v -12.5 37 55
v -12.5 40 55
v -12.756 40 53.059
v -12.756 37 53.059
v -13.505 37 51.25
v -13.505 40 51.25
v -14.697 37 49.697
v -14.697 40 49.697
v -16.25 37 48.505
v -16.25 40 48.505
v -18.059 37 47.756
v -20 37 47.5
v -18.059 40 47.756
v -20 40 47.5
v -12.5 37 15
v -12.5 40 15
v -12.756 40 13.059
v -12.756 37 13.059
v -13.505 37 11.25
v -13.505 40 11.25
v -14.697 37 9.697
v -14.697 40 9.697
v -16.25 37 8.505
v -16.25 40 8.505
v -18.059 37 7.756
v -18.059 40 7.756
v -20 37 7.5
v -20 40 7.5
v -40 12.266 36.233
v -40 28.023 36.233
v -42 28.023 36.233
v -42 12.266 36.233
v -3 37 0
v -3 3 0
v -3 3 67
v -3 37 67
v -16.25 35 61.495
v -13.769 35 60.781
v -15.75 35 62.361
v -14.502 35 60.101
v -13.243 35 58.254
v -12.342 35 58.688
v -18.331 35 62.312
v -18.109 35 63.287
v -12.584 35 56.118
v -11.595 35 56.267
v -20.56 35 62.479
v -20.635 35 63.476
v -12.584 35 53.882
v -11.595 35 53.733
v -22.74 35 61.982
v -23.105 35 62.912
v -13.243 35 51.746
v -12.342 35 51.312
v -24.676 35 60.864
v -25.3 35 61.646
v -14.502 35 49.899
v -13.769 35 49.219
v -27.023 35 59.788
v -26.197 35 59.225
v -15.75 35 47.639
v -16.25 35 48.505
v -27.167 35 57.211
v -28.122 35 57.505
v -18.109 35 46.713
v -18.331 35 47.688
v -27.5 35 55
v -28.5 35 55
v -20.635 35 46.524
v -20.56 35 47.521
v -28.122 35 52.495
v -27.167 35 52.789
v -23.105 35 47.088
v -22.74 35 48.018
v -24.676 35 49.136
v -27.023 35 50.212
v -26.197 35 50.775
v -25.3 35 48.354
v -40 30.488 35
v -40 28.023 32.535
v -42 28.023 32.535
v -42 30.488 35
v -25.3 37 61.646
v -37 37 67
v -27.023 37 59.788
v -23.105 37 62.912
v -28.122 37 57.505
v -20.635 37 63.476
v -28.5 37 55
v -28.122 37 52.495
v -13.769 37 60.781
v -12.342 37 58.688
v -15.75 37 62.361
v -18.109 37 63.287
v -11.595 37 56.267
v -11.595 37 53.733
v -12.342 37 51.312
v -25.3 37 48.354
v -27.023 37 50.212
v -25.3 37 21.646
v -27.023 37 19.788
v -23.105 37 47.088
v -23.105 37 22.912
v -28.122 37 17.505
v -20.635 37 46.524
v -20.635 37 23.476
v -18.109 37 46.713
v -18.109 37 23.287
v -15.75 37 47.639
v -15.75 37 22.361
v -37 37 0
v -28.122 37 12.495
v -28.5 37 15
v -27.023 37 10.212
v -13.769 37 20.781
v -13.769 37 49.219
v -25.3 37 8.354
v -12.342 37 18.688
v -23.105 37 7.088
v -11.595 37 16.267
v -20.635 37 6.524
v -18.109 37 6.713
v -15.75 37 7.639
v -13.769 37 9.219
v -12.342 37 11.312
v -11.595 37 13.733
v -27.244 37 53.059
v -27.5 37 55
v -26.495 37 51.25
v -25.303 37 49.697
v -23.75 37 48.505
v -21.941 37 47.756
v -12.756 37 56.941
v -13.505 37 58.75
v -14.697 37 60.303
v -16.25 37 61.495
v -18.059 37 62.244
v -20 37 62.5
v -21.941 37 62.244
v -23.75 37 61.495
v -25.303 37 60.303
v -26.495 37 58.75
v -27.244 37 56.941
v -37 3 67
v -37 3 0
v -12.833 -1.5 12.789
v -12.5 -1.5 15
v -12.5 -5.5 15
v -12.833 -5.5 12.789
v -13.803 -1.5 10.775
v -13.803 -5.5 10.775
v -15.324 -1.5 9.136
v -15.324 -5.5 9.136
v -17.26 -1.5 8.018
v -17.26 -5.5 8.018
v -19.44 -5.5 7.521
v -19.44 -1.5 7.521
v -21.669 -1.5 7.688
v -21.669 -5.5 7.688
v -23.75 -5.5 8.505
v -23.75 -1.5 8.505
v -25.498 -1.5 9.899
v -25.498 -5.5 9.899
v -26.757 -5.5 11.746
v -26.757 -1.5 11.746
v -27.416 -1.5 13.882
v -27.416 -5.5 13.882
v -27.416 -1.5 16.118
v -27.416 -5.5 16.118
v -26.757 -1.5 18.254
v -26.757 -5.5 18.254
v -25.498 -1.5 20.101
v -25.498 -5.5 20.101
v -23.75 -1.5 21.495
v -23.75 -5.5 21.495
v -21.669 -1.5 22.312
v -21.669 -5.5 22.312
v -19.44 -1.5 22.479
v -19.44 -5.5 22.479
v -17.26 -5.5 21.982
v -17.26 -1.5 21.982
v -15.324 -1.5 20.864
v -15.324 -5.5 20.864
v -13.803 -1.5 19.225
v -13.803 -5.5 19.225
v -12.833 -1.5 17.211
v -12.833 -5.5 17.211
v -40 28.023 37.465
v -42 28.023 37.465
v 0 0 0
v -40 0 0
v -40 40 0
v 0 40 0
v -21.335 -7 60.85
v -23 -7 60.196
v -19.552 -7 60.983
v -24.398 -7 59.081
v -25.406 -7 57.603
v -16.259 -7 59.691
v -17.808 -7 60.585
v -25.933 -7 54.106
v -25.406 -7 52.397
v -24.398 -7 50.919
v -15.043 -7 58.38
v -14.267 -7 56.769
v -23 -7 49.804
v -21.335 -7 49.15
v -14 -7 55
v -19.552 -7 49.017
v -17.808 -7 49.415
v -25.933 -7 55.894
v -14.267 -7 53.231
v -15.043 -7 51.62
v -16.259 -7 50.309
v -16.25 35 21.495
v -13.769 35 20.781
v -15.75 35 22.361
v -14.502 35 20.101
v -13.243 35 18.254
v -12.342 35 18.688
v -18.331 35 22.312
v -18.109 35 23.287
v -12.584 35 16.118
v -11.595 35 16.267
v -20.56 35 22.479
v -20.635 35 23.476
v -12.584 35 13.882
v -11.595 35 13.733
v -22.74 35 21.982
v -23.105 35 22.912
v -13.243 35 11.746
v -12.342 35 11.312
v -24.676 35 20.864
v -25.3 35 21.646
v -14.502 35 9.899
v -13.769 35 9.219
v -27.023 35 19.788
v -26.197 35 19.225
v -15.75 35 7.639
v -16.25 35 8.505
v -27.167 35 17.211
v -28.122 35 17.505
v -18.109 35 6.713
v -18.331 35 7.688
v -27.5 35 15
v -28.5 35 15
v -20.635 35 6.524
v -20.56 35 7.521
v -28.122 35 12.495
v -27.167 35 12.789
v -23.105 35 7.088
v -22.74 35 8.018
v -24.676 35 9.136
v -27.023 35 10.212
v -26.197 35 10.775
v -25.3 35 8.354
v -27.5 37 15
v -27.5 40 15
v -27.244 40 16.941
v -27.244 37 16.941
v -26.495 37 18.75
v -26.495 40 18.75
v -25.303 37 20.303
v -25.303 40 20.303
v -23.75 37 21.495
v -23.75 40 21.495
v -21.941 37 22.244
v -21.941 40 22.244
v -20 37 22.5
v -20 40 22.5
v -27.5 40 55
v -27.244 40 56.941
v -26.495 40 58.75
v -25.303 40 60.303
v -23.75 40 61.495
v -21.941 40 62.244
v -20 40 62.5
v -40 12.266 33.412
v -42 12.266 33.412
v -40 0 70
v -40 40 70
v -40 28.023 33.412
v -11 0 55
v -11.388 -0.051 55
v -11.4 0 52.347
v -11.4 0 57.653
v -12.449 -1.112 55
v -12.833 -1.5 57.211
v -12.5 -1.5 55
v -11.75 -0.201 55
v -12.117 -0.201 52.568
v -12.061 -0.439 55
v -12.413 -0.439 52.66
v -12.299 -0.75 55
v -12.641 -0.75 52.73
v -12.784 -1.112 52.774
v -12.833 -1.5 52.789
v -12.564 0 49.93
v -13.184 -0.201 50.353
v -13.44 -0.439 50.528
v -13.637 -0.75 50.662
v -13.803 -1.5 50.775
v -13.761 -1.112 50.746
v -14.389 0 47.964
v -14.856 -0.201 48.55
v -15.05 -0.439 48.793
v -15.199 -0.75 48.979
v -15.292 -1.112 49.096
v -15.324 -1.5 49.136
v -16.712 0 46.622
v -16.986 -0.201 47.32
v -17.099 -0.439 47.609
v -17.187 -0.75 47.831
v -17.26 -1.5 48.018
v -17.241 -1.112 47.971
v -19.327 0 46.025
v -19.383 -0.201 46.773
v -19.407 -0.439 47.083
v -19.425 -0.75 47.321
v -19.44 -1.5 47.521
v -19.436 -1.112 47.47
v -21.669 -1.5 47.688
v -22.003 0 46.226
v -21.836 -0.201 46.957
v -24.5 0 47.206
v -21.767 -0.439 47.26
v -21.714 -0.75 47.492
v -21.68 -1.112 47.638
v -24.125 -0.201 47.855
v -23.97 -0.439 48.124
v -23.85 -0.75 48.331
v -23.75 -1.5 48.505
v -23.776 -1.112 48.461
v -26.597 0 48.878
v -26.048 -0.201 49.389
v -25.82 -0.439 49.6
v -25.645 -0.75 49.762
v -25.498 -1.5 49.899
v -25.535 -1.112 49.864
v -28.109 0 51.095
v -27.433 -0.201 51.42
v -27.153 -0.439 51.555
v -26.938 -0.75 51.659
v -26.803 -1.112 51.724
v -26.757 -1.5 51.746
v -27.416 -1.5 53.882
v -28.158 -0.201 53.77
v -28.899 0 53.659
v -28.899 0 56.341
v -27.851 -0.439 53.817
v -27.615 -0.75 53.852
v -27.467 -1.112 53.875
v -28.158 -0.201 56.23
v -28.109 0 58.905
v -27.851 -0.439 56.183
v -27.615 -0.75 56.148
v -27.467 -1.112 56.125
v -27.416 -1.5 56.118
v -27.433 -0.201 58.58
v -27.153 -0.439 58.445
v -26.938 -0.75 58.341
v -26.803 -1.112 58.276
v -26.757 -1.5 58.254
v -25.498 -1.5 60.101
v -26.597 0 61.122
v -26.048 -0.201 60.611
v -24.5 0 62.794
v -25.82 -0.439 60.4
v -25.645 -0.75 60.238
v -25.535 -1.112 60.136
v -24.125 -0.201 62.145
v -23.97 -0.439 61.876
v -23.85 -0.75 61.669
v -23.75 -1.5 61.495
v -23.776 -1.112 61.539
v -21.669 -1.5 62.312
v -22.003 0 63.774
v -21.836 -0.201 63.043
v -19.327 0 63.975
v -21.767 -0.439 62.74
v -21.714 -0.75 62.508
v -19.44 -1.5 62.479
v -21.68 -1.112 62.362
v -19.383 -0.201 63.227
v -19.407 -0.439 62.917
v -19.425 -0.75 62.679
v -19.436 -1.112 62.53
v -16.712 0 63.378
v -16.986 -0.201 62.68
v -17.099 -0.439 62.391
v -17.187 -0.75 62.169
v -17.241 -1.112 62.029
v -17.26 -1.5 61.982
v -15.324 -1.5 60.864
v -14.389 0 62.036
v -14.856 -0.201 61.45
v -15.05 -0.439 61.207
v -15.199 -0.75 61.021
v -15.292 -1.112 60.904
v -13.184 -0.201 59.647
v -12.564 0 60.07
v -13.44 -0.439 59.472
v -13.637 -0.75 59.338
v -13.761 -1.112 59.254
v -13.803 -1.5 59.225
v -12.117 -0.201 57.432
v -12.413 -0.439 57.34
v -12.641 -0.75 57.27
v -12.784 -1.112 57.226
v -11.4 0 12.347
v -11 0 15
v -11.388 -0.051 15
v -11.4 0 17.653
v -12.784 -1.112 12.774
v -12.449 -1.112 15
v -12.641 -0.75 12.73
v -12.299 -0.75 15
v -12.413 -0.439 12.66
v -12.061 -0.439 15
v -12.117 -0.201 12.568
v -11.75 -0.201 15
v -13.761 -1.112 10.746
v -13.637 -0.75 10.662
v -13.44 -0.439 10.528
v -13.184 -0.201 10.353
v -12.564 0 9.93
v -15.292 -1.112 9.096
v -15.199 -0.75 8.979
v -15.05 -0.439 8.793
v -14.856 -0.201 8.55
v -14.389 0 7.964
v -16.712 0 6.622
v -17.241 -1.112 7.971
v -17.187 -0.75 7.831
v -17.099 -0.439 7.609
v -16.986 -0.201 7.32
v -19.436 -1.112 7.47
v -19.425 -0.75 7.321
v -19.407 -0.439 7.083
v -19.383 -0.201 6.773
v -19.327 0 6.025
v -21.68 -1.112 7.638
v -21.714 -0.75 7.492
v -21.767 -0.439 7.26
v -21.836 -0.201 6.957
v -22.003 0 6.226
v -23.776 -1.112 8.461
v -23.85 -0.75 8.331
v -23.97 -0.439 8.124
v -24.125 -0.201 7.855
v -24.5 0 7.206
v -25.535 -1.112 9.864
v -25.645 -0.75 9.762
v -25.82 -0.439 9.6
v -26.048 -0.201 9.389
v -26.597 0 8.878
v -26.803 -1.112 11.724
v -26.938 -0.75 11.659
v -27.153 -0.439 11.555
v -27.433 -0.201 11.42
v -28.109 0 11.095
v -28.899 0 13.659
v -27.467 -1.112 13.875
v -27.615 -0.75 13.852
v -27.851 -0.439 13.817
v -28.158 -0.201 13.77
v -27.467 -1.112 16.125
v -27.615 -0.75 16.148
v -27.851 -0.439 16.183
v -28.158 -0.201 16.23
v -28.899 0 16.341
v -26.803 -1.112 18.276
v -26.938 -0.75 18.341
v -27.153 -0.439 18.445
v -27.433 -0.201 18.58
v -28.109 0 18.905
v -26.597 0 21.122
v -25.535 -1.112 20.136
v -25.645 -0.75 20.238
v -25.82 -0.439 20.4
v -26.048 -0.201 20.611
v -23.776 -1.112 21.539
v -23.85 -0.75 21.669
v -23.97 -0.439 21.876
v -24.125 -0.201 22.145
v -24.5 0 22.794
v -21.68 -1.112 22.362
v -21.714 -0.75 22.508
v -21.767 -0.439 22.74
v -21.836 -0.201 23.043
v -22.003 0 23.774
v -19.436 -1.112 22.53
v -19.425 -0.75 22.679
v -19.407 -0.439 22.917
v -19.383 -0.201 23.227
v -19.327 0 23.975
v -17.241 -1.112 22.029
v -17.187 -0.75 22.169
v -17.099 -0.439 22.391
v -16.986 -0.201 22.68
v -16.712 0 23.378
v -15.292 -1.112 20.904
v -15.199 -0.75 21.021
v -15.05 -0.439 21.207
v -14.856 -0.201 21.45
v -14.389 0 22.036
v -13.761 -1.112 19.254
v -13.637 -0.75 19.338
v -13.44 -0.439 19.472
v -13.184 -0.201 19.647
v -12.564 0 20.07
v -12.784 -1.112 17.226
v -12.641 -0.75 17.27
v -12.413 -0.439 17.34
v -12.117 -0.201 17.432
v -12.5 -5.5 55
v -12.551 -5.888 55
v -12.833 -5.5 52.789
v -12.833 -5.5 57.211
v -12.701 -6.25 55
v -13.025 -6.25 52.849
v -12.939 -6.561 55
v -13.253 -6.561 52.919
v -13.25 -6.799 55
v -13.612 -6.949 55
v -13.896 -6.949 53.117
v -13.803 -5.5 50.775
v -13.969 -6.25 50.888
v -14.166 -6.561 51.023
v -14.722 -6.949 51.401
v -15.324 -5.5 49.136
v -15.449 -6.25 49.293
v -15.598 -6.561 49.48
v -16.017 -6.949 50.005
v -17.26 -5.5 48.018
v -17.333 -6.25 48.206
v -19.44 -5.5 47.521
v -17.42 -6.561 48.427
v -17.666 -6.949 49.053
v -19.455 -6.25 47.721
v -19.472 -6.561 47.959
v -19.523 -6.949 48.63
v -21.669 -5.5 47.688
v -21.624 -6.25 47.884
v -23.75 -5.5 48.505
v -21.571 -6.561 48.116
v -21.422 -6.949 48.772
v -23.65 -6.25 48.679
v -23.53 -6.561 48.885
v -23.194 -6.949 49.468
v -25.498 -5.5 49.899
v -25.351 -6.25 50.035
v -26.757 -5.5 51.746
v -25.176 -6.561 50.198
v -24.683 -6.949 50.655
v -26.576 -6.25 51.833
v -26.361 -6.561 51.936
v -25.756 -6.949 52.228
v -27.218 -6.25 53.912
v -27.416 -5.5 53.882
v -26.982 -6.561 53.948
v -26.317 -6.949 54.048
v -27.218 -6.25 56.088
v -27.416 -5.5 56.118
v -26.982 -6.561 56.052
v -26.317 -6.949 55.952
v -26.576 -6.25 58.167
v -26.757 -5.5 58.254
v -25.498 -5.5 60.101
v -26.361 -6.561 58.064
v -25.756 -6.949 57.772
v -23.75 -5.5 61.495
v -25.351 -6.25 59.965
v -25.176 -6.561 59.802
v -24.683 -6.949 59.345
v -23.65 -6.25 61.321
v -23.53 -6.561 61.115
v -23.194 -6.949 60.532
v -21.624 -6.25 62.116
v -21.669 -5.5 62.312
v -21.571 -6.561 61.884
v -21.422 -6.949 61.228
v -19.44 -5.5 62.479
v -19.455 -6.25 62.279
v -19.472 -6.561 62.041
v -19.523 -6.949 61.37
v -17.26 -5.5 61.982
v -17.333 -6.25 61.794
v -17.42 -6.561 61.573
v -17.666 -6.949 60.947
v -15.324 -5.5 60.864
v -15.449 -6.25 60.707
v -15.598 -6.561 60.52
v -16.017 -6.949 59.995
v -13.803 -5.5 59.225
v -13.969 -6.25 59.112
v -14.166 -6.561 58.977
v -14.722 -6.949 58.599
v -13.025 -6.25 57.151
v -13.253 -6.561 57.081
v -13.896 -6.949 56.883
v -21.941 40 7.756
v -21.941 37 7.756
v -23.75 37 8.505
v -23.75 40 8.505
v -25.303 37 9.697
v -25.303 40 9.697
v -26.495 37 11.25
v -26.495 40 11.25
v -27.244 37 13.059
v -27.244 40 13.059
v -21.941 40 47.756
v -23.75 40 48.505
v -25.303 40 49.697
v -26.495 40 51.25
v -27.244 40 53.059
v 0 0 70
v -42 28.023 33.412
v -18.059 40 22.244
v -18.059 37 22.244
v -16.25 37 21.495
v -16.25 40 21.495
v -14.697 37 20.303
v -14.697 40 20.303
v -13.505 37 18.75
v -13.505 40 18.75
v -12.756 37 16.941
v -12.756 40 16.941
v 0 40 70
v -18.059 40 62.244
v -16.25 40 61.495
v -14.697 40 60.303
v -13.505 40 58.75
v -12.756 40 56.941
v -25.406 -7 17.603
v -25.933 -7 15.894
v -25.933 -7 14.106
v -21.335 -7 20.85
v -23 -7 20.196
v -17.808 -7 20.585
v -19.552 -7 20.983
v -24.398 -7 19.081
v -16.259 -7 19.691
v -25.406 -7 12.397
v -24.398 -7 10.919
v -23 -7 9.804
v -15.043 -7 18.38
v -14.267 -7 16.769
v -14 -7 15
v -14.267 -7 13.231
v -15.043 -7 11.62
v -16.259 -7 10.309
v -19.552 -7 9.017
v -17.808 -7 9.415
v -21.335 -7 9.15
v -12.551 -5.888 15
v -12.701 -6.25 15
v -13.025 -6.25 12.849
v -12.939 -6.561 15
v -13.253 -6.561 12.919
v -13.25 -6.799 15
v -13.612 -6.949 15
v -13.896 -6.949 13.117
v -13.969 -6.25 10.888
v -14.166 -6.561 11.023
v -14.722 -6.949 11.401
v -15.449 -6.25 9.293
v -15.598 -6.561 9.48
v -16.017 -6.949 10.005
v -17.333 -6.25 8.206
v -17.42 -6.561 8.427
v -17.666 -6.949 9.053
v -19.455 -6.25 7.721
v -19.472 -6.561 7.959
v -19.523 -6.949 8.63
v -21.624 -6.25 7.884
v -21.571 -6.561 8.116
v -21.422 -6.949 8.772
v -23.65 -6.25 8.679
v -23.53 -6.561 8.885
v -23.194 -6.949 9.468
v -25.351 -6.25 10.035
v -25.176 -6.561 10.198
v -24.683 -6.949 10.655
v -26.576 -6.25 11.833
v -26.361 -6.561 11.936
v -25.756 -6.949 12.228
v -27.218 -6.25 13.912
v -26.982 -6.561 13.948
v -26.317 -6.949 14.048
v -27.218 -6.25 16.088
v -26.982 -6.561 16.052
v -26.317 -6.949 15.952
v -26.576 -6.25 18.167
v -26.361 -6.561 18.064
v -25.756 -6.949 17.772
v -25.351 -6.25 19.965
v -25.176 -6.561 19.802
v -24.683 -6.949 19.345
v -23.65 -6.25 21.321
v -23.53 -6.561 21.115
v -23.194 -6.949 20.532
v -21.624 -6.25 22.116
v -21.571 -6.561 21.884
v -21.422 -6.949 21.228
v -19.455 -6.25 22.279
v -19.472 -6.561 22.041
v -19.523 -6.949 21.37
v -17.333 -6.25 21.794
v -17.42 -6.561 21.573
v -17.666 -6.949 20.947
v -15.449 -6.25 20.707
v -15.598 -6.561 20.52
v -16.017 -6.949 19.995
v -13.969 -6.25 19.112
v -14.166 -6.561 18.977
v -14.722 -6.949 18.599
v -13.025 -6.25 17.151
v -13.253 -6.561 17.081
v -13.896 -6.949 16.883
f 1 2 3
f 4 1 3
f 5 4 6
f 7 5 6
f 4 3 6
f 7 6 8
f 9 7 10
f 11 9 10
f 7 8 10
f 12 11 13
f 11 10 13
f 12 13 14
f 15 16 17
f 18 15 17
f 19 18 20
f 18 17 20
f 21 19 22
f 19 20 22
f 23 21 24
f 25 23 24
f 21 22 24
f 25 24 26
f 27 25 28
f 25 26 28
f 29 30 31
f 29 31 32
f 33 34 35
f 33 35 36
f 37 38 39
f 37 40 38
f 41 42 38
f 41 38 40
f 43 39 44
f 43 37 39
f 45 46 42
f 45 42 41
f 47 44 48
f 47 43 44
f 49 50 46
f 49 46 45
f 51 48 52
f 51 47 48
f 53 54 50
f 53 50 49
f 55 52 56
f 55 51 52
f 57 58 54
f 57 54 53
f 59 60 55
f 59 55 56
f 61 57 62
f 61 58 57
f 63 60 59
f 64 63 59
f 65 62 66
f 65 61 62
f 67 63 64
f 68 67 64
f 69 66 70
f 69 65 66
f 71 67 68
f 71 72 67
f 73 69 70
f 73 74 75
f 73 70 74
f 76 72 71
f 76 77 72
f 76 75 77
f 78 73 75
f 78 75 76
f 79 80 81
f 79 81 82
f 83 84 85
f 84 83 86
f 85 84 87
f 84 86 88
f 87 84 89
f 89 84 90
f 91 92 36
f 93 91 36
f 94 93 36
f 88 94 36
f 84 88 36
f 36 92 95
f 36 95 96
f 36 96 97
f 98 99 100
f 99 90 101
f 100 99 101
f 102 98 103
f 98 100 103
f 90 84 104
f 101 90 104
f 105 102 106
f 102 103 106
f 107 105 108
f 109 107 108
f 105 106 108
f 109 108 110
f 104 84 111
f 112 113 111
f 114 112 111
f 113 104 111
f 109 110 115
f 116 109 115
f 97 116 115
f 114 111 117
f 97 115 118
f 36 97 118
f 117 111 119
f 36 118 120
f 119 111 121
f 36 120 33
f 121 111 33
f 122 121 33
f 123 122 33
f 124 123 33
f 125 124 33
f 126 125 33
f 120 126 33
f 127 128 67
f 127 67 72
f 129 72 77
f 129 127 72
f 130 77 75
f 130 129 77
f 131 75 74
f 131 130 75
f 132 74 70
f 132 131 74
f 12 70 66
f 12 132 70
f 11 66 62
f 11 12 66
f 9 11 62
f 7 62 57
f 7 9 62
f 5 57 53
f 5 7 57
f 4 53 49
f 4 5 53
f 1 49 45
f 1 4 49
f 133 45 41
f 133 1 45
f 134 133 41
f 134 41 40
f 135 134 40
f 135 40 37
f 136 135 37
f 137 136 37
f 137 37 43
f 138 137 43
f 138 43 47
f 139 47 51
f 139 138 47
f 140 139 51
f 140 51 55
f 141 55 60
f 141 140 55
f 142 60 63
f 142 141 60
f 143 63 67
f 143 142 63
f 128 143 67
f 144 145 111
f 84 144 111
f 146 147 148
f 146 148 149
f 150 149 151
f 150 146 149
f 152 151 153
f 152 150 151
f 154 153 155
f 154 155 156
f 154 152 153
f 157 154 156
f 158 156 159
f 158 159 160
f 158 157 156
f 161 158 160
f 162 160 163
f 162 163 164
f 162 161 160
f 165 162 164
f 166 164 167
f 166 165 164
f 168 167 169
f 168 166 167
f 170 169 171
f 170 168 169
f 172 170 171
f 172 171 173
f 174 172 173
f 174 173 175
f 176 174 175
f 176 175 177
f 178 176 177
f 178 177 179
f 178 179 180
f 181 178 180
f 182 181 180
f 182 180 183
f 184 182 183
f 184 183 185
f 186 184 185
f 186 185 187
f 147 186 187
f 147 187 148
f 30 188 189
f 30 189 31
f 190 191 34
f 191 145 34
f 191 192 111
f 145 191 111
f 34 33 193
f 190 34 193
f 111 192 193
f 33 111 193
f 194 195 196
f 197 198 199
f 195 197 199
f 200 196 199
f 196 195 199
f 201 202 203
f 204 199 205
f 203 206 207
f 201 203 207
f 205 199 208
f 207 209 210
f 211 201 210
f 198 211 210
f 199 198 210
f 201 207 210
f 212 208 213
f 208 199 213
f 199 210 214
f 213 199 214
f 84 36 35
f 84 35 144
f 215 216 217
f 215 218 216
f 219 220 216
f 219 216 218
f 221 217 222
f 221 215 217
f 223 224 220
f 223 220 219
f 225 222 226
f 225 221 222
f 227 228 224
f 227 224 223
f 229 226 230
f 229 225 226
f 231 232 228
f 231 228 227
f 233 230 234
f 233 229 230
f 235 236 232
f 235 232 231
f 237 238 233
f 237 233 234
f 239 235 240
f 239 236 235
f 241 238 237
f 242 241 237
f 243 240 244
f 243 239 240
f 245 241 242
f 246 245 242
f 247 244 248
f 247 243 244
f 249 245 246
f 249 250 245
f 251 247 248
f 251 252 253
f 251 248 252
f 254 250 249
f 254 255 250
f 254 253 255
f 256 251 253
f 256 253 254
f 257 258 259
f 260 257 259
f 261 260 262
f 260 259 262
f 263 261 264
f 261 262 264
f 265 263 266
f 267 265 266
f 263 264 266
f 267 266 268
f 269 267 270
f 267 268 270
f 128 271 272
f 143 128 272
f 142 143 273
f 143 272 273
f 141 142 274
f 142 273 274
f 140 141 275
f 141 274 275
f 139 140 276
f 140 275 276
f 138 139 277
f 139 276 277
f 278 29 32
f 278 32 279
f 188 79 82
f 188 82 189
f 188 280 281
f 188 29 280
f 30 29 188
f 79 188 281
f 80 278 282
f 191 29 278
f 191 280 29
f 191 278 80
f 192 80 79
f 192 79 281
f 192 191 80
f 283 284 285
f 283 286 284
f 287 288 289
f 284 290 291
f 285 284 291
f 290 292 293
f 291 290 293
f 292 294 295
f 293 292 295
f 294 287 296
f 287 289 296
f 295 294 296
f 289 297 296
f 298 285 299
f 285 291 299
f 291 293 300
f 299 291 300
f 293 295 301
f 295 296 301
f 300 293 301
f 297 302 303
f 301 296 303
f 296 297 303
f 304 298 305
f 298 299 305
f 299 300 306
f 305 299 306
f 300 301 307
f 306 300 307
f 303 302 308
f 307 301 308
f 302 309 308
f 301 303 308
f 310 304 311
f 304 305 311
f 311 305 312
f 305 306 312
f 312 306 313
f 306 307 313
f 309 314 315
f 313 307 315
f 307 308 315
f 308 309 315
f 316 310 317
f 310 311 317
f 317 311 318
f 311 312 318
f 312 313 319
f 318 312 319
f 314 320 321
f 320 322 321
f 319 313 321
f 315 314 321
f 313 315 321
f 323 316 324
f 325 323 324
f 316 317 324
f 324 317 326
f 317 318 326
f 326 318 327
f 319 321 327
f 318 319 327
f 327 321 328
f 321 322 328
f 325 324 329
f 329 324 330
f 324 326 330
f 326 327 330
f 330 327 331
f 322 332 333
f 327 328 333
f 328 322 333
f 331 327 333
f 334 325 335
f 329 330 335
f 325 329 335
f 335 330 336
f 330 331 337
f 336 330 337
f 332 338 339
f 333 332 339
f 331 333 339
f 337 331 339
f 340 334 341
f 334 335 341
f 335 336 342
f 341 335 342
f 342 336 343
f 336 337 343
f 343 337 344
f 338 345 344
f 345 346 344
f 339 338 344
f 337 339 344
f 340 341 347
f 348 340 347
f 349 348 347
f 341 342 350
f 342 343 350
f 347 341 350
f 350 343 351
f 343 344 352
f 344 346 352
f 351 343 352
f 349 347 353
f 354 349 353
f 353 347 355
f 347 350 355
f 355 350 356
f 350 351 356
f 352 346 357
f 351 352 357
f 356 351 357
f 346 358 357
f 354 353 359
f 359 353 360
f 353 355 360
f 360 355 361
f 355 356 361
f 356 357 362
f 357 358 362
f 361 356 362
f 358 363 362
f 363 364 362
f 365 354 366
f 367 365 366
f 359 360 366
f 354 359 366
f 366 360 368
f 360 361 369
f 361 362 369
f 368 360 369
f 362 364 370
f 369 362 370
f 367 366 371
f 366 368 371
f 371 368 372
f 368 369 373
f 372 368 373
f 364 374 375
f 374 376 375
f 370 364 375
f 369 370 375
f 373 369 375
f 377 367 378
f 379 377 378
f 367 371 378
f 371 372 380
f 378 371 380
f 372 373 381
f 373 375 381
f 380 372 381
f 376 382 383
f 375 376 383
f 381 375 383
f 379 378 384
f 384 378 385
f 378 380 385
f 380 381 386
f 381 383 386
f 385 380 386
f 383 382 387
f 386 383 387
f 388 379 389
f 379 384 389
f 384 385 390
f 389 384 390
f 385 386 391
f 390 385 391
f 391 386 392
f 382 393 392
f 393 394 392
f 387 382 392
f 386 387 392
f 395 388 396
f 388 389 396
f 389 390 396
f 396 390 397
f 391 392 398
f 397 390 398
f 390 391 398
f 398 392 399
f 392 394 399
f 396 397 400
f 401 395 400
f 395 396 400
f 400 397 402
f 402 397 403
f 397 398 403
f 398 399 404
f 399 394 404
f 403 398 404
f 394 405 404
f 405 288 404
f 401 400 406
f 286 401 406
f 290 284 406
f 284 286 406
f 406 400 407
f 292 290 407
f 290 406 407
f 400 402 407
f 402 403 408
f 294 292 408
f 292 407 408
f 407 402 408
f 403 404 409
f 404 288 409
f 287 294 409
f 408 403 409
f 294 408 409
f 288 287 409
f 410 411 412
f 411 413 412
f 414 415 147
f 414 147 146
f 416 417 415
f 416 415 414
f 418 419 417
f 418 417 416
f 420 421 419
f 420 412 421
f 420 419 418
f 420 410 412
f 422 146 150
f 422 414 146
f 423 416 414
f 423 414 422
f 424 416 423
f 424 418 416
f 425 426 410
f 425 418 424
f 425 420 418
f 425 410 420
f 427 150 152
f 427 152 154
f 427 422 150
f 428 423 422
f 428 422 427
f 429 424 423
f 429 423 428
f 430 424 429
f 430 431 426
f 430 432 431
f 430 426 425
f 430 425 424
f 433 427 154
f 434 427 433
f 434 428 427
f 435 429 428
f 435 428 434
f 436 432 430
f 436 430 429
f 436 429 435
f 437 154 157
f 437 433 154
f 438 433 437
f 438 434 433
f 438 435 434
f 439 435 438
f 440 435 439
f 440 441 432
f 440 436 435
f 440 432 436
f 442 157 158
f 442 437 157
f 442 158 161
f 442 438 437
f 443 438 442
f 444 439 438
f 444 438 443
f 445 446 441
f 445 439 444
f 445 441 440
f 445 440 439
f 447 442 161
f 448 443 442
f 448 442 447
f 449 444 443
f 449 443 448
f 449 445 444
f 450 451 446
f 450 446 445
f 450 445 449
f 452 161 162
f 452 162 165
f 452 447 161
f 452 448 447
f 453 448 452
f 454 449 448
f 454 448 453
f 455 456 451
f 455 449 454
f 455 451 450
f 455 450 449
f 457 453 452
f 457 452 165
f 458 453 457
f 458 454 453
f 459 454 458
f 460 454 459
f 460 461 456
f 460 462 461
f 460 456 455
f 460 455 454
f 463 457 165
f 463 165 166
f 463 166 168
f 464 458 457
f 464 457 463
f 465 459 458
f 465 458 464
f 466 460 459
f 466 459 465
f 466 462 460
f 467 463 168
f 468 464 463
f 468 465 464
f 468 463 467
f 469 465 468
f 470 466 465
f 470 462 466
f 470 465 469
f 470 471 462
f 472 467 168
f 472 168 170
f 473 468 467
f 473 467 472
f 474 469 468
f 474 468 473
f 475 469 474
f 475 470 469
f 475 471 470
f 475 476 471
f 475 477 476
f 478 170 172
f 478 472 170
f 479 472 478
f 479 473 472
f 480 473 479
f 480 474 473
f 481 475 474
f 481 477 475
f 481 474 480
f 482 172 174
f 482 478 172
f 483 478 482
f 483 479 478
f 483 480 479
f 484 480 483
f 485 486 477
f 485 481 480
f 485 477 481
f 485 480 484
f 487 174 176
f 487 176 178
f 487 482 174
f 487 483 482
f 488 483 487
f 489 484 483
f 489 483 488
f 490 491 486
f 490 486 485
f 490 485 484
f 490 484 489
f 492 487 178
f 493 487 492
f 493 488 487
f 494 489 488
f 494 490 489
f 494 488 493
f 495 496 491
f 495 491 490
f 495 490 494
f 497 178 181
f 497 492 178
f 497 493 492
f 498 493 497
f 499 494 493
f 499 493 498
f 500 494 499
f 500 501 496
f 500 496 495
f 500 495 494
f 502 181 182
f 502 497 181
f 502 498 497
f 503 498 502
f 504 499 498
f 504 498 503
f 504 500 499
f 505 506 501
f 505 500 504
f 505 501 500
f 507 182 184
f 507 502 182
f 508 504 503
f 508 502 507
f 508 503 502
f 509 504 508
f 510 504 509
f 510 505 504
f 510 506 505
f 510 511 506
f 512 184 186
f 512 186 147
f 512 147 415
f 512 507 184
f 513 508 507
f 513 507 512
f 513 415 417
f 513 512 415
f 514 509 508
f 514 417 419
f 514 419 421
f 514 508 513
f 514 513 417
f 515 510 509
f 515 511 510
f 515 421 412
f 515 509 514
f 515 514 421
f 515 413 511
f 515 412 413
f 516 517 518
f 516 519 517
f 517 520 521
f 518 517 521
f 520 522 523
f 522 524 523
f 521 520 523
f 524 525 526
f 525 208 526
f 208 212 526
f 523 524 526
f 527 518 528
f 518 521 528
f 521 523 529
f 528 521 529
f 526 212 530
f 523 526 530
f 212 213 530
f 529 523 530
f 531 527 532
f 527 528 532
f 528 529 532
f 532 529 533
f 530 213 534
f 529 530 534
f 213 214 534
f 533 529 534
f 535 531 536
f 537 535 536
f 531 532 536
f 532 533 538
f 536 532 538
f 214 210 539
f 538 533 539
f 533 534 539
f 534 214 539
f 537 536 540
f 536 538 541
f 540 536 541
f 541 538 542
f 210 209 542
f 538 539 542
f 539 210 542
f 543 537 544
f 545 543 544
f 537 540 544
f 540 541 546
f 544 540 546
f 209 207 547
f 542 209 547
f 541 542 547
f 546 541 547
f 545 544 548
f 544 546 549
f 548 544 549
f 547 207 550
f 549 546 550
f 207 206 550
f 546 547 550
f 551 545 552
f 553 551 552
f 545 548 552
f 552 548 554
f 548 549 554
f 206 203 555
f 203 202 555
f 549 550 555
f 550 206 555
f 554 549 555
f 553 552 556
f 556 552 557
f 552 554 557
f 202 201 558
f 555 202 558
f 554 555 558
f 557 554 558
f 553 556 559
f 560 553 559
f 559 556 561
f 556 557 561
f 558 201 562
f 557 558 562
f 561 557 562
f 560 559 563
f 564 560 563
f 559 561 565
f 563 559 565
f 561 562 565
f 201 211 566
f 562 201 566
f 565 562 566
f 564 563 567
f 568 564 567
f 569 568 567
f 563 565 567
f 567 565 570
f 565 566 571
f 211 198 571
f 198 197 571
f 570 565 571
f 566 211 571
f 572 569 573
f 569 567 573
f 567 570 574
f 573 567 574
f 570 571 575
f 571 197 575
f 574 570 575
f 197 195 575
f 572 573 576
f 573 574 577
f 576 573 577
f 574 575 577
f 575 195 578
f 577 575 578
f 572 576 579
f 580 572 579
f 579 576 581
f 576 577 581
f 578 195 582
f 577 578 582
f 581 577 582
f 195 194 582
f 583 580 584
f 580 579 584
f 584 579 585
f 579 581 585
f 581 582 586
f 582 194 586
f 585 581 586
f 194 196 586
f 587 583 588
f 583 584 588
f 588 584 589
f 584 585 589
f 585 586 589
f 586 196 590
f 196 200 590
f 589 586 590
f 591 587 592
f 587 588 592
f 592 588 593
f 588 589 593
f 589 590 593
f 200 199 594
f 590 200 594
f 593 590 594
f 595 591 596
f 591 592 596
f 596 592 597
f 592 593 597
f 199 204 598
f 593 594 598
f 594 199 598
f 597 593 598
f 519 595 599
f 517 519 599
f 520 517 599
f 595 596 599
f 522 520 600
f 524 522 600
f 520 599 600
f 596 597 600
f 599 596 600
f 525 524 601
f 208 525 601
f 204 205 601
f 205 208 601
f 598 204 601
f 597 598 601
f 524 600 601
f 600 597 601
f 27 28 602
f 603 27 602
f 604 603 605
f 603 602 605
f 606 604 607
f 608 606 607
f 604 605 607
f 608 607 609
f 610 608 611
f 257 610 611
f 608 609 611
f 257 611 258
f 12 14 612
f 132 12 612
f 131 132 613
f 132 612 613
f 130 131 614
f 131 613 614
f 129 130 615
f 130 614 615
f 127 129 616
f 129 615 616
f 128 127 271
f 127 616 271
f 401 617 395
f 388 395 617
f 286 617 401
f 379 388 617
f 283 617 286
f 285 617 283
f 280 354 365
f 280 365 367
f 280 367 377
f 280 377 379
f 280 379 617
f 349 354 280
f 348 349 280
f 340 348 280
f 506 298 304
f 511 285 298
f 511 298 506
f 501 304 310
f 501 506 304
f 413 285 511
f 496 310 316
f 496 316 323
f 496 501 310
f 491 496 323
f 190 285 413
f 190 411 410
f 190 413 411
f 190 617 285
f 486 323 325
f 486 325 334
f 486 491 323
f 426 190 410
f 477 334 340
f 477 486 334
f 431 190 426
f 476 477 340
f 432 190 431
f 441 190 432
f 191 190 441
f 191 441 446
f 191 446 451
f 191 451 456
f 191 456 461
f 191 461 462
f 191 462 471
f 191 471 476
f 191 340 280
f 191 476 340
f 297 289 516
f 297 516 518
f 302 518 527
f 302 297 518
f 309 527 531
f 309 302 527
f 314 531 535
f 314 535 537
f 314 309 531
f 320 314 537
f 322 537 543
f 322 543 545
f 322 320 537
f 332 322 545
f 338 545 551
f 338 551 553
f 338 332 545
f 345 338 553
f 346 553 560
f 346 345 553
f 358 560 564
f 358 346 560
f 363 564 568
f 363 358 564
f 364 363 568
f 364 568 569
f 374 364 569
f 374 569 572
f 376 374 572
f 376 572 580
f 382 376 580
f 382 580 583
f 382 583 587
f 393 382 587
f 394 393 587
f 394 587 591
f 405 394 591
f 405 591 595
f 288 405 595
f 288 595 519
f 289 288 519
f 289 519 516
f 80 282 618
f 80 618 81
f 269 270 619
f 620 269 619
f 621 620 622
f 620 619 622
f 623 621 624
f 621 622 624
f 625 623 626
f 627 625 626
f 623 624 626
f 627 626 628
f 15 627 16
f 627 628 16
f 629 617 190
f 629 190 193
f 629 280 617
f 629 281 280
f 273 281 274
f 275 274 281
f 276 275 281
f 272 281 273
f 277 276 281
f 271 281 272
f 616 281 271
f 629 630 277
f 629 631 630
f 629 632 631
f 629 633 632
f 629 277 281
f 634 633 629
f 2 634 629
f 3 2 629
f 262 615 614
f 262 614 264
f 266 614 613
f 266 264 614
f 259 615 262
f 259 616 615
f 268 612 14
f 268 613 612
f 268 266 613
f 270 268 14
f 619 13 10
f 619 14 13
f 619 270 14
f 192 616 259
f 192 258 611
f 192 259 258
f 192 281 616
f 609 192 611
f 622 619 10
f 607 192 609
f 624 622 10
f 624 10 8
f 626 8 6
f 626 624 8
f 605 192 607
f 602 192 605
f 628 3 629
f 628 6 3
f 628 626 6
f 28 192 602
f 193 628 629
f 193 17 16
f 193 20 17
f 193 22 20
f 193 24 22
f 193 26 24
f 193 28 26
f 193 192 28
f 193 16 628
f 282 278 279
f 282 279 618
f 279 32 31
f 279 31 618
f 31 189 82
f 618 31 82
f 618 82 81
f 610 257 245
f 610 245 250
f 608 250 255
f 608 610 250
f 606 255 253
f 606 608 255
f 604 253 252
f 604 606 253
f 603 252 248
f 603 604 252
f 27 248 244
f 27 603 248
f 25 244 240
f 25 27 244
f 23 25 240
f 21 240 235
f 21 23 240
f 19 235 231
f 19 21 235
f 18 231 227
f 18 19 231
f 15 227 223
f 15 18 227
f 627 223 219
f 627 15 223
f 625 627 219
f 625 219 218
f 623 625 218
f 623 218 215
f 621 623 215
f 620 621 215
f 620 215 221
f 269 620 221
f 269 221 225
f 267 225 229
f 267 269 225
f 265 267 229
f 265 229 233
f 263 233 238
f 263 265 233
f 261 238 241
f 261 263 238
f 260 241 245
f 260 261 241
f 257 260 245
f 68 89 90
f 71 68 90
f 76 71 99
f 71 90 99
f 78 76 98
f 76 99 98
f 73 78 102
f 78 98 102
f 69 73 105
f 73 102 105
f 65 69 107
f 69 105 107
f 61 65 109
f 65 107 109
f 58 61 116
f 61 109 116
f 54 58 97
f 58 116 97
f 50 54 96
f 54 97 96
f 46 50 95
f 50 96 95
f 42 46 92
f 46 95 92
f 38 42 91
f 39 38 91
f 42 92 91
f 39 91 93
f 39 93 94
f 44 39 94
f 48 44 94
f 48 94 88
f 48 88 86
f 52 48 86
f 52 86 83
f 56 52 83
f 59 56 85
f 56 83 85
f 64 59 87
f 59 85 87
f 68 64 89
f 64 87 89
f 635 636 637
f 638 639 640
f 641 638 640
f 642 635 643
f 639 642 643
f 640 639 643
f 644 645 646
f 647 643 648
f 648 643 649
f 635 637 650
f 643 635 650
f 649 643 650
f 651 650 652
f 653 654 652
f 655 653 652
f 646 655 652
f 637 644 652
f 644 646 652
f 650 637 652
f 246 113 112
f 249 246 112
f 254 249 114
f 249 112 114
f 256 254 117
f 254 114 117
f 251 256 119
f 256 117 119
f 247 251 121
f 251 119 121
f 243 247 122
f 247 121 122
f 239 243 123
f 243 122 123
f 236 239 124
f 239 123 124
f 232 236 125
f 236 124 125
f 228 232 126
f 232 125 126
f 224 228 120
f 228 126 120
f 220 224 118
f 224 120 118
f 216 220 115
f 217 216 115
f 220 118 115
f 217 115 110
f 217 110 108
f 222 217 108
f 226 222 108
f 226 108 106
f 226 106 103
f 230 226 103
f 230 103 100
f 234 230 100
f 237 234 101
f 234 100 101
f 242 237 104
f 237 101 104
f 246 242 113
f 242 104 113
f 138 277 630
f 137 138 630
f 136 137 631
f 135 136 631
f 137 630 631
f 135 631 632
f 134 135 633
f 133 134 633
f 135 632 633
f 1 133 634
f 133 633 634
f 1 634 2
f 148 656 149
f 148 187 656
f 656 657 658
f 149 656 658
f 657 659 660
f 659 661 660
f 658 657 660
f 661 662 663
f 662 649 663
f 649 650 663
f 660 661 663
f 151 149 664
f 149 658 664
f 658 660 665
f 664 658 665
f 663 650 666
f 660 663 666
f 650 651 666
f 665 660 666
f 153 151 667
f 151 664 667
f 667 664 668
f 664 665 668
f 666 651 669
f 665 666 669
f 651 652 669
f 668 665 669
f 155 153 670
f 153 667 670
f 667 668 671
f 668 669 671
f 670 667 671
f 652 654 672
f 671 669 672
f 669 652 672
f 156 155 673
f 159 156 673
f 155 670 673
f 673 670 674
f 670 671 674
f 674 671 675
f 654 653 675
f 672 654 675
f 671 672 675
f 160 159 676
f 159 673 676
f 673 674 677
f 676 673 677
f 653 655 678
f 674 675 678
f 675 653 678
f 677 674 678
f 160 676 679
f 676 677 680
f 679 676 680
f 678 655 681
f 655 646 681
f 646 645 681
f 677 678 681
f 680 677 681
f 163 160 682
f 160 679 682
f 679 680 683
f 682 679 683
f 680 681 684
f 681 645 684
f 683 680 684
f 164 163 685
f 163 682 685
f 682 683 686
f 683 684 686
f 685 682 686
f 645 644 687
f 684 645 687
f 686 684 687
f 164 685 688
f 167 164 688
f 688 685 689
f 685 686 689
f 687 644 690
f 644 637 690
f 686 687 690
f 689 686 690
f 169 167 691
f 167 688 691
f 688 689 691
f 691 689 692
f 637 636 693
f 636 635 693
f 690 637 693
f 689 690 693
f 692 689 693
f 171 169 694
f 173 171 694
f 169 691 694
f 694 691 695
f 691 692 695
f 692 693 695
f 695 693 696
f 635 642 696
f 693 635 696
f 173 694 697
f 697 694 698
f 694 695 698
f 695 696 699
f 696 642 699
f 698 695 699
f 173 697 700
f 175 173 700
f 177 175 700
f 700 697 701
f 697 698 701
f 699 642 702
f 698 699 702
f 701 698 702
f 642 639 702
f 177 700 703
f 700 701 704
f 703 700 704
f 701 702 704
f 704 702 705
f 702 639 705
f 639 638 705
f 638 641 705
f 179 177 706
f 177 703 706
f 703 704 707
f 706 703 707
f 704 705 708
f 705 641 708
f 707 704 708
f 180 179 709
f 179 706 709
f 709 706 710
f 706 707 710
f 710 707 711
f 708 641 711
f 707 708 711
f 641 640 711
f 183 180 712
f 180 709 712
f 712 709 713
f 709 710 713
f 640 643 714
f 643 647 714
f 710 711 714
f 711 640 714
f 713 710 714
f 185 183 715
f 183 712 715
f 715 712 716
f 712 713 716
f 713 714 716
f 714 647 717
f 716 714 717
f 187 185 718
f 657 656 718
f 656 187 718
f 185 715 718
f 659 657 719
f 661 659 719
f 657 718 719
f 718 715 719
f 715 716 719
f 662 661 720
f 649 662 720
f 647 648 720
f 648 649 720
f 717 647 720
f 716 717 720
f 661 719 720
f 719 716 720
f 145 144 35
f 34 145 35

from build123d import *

# Parameters (mm, degrees)
SKETCH1_W           = 40
SKETCH1_H           = 40
SKETCH1_W_2         = 34
SKETCH1_H_2         = 34
BOSS_EXTRUDE1_DEPTH = 70
SKETCH2_W           = 34
SKETCH2_H           = 3
BOSS_EXTRUDE2_DEPTH = 37
CUT_EXTRUDE1_DEPTH  = 37
SKETCH4_R           = 8.5
SKETCH4_R_2         = 7.5
BOSS_EXTRUDE3_DEPTH = 2
SKETCH6_R           = 7.5
BOSS_EXTRUDE4_DEPTH = 10
FILLET2_R           = 1.5
FILLET3_R           = 1.5
FILLET4_R           = 1.5
FILLET5_R           = 1.5
BOSS_EXTRUDE5_DEPTH = 2


with BuildPart() as part:
    # Sketch1 → Boss-Extrude1 (new body)
    with BuildSketch(Plane.XY):
        with Locations((-20, 20)):
            Rectangle(SKETCH1_W, SKETCH1_H)
        with Locations((-20, 20)):
            Rectangle(SKETCH1_W_2, SKETCH1_H_2, mode=Mode.SUBTRACT)
    extrude(amount=BOSS_EXTRUDE1_DEPTH)

    # Sketch2 → Boss-Extrude2 (add)
    with BuildSketch(Plane(origin=(0, 37, 0), x_dir=(-1, 0, 0), z_dir=(0, -1, 0))):
        with Locations((20, -68.5)):
            Rectangle(SKETCH2_W, SKETCH2_H)
    extrude(amount=BOSS_EXTRUDE2_DEPTH)

    # Sketch3 → Cut-Extrude1 (cut)
    with BuildSketch(Plane(origin=(0, 40, 0), x_dir=(1, 0, 0), z_dir=(0, 1, 0))):
        with BuildLine():
            ThreePointArc((-12.5, -15), (-14.696699141, -9.696699141), (-20, -7.5))
            Line((-20, -7.5), (-20, -15))
            Line((-20, -15), (-12.5, -15))
        make_face()
        with BuildLine():
            Line((-20, -15), (-20, -7.5))
            ThreePointArc((-20, -7.5), (-25.303300859, -9.696699141), (-27.5, -15))
            Line((-27.5, -15), (-20, -15))
        make_face()
        with BuildLine():
            Line((-12.5, -15), (-20, -15))
            Line((-20, -15), (-20, -22.5))
            ThreePointArc((-20, -22.5), (-14.696699141, -20.303300859), (-12.5, -15))
        make_face()
        with BuildLine():
            Line((-20, -22.5), (-20, -15))
            Line((-20, -15), (-27.5, -15))
            ThreePointArc((-27.5, -15), (-25.303300859, -20.303300859), (-20, -22.5))
        make_face()
        with BuildLine():
            ThreePointArc((-12.5, -55), (-14.696699141, -49.696699141), (-20, -47.5))
            Line((-20, -47.5), (-20, -55))
            Line((-20, -55), (-12.5, -55))
        make_face()
        with BuildLine():
            Line((-20, -55), (-20, -47.5))
            ThreePointArc((-20, -47.5), (-25.303300859, -49.696699141), (-27.5, -55))
            Line((-27.5, -55), (-20, -55))
        make_face()
        with BuildLine():
            Line((-12.5, -55), (-20, -55))
            Line((-20, -55), (-20, -62.5))
            ThreePointArc((-20, -62.5), (-14.696699141, -60.303300859), (-12.5, -55))
        make_face()
        with BuildLine():
            Line((-20, -62.5), (-20, -55))
            Line((-20, -55), (-27.5, -55))
            ThreePointArc((-27.5, -55), (-25.303300859, -60.303300859), (-20, -62.5))
        make_face()
    extrude(amount=-CUT_EXTRUDE1_DEPTH, mode=Mode.SUBTRACT)

    # Sketch4 → Boss-Extrude3 (add)
    with BuildSketch(Plane(origin=(0, 37, 0), x_dir=(-1, 0, 0), z_dir=(0, -1, 0))):
        with Locations((20, -15)):
            Circle(SKETCH4_R)
        with Locations((20, -15)):
            Circle(SKETCH4_R_2, mode=Mode.SUBTRACT)
        with Locations((20, -55)):
            Circle(SKETCH4_R)
        with Locations((20, -55)):
            Circle(SKETCH4_R_2, mode=Mode.SUBTRACT)
    extrude(amount=BOSS_EXTRUDE3_DEPTH)

    # Sketch6 → Boss-Extrude4 (add)
    with BuildSketch(Plane(origin=(0, 3, 0), x_dir=(1, 0, 0), z_dir=(0, 1, 0))):
        with Locations((-20, -15)):
            Circle(SKETCH6_R)
        with Locations((-20, -55)):
            Circle(SKETCH6_R)
    extrude(amount=-BOSS_EXTRUDE4_DEPTH)

    # Fillet2
    fillet2_edges = [part.edges().sort_by_distance(p)[0] for p in [
        (-27.5, -7, 55),
    ]]
    fillet(fillet2_edges, radius=FILLET2_R)

    # Fillet3
    fillet3_edges = [part.edges().sort_by_distance(p)[0] for p in [
        (-27.5, -7, 15),
    ]]
    fillet(fillet3_edges, radius=FILLET3_R)

    # Fillet4
    fillet4_edges = [part.edges().sort_by_distance(p)[0] for p in [
        (-27.5, 0, 15),
    ]]
    fillet(fillet4_edges, radius=FILLET4_R)

    # Fillet5
    fillet5_edges = [part.edges().sort_by_distance(p)[0] for p in [
        (-27.5, 0, 55),
    ]]
    fillet(fillet5_edges, radius=FILLET5_R)

    # Sketch9 → Boss-Extrude5 (add)
    with BuildSketch(Plane.ZY.offset(40)):
        Polygon((35, 30.488163829), (37.465362362, 28.022801468), (36.232681181, 28.022801468), (36.232681181, 12.265663865), (33.412251244, 12.265663865), (33.412251244, 28.022801468), (32.534637638, 28.022801468), align=None)
    extrude(amount=BOSS_EXTRUDE5_DEPTH)


solid = part.part
